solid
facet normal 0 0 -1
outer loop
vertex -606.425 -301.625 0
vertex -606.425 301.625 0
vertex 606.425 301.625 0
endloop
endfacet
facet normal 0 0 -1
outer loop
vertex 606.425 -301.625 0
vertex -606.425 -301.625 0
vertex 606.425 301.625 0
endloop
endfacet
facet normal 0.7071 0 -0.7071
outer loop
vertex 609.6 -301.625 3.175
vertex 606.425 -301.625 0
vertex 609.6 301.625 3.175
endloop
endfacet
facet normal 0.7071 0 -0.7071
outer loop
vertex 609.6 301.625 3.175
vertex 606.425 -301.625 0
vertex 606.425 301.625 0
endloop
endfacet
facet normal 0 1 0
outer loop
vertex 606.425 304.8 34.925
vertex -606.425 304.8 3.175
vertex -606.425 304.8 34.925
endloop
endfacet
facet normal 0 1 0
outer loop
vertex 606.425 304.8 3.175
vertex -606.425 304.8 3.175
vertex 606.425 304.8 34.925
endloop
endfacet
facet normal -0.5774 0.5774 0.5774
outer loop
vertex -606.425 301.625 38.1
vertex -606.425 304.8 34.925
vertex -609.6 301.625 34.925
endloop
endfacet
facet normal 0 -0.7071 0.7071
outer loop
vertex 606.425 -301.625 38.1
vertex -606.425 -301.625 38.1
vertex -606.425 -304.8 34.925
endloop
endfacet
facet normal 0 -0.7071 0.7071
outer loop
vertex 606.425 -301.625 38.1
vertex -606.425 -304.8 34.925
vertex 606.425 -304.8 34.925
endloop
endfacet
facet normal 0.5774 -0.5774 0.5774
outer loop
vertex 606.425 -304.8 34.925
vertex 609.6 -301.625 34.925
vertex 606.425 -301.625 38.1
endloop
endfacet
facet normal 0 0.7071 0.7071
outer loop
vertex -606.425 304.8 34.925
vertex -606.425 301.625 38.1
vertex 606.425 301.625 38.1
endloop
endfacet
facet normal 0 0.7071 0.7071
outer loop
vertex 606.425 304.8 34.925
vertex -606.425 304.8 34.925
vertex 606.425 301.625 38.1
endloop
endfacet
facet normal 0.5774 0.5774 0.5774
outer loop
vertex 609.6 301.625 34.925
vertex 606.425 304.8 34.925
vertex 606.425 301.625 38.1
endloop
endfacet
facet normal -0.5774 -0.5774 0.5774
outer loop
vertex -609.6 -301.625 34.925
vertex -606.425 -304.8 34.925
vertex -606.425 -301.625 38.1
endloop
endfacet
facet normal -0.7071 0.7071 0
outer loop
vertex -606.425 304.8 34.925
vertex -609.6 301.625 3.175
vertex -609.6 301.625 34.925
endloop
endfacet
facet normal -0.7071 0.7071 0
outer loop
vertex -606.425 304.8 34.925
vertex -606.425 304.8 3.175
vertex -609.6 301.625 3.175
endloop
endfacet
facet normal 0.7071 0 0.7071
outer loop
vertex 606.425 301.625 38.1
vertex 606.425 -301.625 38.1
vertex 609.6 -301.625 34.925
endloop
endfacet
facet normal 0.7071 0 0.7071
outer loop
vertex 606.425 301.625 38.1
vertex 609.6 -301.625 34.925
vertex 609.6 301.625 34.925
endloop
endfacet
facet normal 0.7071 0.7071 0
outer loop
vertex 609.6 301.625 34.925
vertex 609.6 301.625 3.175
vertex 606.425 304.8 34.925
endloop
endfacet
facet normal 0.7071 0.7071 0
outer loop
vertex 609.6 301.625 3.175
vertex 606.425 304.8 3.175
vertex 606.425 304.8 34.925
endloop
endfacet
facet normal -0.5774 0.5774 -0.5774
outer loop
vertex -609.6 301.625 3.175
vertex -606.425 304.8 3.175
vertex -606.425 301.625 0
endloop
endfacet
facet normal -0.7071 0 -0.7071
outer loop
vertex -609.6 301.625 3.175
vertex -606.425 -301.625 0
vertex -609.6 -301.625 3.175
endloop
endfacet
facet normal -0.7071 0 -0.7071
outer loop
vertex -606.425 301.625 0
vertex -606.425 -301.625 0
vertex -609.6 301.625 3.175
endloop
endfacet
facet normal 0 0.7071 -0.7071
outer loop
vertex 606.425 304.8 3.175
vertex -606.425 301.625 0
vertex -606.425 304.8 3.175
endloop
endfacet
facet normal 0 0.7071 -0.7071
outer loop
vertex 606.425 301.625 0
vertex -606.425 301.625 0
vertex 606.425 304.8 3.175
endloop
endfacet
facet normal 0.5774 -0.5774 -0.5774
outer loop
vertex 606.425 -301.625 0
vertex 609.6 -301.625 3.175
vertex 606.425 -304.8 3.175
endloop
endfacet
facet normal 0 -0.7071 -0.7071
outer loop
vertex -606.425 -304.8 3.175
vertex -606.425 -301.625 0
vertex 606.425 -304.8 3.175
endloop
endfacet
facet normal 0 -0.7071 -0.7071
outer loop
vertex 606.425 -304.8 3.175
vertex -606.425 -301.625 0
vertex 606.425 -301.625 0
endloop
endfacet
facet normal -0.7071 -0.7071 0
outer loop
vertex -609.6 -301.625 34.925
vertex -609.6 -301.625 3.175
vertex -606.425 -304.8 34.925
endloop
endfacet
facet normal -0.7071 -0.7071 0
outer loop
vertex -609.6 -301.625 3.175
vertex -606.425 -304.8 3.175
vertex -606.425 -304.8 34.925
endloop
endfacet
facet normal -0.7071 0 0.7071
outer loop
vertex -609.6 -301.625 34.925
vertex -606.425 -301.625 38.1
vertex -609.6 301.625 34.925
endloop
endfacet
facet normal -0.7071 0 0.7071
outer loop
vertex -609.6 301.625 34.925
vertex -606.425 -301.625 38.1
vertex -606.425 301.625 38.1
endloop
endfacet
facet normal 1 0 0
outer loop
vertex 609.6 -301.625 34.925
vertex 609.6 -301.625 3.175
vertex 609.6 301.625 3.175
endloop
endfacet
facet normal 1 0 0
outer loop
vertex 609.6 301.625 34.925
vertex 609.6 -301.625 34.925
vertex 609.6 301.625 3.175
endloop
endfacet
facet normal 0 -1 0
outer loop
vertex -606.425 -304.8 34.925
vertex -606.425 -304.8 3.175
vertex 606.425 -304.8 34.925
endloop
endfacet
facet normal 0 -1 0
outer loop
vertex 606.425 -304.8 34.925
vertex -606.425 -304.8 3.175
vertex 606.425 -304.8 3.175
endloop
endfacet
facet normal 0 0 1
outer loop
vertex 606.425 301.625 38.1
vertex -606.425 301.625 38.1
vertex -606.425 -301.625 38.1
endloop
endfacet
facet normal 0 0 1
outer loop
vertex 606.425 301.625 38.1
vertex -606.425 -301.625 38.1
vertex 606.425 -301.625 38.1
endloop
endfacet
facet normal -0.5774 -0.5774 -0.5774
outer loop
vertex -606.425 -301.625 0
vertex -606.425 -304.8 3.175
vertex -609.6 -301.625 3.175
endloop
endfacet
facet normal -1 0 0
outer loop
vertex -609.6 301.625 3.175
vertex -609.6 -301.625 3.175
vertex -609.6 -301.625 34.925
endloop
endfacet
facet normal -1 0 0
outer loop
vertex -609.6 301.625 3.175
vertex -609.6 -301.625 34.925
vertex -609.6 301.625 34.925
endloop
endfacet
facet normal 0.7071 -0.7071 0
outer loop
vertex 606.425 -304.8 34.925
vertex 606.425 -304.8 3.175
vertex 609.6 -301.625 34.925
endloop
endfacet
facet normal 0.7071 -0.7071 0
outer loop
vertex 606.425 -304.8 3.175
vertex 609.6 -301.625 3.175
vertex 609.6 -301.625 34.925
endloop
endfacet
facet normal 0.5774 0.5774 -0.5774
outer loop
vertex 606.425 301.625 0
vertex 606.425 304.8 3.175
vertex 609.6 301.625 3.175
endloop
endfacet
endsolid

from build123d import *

# Parameters (mm, degrees)
SKETCH1_W          = 1219.2
SKETCH1_H          = 609.6
BASE_EXTRUDE_DEPTH = 38.1
CHAMFER1_SIZE      = 3.175


with BuildPart() as part:
    # Sketch1 → Base-Extrude (new body)
    with BuildSketch(Plane.XY):
        Rectangle(SKETCH1_W, SKETCH1_H)
    extrude(amount=BASE_EXTRUDE_DEPTH)

    # Chamfer1
    chamfer1_edges = [part.edges().sort_by_distance(p)[0] for p in [
        (-609.6, 304.8, 19.05),
        (609.6, 304.8, 19.05),
        (0, 304.8, 0),
        (0, 304.8, 38.1),
        (609.6, -304.8, 19.05),
        (609.6, 0, 0),
        (609.6, 0, 38.1),
        (-609.6, -304.8, 19.05),
        (0, -304.8, 0),
        (0, -304.8, 38.1),
        (-609.6, 0, 0),
        (-609.6, 0, 38.1),
    ]]
    chamfer(chamfer1_edges, length=CHAMFER1_SIZE)


solid = part.part
